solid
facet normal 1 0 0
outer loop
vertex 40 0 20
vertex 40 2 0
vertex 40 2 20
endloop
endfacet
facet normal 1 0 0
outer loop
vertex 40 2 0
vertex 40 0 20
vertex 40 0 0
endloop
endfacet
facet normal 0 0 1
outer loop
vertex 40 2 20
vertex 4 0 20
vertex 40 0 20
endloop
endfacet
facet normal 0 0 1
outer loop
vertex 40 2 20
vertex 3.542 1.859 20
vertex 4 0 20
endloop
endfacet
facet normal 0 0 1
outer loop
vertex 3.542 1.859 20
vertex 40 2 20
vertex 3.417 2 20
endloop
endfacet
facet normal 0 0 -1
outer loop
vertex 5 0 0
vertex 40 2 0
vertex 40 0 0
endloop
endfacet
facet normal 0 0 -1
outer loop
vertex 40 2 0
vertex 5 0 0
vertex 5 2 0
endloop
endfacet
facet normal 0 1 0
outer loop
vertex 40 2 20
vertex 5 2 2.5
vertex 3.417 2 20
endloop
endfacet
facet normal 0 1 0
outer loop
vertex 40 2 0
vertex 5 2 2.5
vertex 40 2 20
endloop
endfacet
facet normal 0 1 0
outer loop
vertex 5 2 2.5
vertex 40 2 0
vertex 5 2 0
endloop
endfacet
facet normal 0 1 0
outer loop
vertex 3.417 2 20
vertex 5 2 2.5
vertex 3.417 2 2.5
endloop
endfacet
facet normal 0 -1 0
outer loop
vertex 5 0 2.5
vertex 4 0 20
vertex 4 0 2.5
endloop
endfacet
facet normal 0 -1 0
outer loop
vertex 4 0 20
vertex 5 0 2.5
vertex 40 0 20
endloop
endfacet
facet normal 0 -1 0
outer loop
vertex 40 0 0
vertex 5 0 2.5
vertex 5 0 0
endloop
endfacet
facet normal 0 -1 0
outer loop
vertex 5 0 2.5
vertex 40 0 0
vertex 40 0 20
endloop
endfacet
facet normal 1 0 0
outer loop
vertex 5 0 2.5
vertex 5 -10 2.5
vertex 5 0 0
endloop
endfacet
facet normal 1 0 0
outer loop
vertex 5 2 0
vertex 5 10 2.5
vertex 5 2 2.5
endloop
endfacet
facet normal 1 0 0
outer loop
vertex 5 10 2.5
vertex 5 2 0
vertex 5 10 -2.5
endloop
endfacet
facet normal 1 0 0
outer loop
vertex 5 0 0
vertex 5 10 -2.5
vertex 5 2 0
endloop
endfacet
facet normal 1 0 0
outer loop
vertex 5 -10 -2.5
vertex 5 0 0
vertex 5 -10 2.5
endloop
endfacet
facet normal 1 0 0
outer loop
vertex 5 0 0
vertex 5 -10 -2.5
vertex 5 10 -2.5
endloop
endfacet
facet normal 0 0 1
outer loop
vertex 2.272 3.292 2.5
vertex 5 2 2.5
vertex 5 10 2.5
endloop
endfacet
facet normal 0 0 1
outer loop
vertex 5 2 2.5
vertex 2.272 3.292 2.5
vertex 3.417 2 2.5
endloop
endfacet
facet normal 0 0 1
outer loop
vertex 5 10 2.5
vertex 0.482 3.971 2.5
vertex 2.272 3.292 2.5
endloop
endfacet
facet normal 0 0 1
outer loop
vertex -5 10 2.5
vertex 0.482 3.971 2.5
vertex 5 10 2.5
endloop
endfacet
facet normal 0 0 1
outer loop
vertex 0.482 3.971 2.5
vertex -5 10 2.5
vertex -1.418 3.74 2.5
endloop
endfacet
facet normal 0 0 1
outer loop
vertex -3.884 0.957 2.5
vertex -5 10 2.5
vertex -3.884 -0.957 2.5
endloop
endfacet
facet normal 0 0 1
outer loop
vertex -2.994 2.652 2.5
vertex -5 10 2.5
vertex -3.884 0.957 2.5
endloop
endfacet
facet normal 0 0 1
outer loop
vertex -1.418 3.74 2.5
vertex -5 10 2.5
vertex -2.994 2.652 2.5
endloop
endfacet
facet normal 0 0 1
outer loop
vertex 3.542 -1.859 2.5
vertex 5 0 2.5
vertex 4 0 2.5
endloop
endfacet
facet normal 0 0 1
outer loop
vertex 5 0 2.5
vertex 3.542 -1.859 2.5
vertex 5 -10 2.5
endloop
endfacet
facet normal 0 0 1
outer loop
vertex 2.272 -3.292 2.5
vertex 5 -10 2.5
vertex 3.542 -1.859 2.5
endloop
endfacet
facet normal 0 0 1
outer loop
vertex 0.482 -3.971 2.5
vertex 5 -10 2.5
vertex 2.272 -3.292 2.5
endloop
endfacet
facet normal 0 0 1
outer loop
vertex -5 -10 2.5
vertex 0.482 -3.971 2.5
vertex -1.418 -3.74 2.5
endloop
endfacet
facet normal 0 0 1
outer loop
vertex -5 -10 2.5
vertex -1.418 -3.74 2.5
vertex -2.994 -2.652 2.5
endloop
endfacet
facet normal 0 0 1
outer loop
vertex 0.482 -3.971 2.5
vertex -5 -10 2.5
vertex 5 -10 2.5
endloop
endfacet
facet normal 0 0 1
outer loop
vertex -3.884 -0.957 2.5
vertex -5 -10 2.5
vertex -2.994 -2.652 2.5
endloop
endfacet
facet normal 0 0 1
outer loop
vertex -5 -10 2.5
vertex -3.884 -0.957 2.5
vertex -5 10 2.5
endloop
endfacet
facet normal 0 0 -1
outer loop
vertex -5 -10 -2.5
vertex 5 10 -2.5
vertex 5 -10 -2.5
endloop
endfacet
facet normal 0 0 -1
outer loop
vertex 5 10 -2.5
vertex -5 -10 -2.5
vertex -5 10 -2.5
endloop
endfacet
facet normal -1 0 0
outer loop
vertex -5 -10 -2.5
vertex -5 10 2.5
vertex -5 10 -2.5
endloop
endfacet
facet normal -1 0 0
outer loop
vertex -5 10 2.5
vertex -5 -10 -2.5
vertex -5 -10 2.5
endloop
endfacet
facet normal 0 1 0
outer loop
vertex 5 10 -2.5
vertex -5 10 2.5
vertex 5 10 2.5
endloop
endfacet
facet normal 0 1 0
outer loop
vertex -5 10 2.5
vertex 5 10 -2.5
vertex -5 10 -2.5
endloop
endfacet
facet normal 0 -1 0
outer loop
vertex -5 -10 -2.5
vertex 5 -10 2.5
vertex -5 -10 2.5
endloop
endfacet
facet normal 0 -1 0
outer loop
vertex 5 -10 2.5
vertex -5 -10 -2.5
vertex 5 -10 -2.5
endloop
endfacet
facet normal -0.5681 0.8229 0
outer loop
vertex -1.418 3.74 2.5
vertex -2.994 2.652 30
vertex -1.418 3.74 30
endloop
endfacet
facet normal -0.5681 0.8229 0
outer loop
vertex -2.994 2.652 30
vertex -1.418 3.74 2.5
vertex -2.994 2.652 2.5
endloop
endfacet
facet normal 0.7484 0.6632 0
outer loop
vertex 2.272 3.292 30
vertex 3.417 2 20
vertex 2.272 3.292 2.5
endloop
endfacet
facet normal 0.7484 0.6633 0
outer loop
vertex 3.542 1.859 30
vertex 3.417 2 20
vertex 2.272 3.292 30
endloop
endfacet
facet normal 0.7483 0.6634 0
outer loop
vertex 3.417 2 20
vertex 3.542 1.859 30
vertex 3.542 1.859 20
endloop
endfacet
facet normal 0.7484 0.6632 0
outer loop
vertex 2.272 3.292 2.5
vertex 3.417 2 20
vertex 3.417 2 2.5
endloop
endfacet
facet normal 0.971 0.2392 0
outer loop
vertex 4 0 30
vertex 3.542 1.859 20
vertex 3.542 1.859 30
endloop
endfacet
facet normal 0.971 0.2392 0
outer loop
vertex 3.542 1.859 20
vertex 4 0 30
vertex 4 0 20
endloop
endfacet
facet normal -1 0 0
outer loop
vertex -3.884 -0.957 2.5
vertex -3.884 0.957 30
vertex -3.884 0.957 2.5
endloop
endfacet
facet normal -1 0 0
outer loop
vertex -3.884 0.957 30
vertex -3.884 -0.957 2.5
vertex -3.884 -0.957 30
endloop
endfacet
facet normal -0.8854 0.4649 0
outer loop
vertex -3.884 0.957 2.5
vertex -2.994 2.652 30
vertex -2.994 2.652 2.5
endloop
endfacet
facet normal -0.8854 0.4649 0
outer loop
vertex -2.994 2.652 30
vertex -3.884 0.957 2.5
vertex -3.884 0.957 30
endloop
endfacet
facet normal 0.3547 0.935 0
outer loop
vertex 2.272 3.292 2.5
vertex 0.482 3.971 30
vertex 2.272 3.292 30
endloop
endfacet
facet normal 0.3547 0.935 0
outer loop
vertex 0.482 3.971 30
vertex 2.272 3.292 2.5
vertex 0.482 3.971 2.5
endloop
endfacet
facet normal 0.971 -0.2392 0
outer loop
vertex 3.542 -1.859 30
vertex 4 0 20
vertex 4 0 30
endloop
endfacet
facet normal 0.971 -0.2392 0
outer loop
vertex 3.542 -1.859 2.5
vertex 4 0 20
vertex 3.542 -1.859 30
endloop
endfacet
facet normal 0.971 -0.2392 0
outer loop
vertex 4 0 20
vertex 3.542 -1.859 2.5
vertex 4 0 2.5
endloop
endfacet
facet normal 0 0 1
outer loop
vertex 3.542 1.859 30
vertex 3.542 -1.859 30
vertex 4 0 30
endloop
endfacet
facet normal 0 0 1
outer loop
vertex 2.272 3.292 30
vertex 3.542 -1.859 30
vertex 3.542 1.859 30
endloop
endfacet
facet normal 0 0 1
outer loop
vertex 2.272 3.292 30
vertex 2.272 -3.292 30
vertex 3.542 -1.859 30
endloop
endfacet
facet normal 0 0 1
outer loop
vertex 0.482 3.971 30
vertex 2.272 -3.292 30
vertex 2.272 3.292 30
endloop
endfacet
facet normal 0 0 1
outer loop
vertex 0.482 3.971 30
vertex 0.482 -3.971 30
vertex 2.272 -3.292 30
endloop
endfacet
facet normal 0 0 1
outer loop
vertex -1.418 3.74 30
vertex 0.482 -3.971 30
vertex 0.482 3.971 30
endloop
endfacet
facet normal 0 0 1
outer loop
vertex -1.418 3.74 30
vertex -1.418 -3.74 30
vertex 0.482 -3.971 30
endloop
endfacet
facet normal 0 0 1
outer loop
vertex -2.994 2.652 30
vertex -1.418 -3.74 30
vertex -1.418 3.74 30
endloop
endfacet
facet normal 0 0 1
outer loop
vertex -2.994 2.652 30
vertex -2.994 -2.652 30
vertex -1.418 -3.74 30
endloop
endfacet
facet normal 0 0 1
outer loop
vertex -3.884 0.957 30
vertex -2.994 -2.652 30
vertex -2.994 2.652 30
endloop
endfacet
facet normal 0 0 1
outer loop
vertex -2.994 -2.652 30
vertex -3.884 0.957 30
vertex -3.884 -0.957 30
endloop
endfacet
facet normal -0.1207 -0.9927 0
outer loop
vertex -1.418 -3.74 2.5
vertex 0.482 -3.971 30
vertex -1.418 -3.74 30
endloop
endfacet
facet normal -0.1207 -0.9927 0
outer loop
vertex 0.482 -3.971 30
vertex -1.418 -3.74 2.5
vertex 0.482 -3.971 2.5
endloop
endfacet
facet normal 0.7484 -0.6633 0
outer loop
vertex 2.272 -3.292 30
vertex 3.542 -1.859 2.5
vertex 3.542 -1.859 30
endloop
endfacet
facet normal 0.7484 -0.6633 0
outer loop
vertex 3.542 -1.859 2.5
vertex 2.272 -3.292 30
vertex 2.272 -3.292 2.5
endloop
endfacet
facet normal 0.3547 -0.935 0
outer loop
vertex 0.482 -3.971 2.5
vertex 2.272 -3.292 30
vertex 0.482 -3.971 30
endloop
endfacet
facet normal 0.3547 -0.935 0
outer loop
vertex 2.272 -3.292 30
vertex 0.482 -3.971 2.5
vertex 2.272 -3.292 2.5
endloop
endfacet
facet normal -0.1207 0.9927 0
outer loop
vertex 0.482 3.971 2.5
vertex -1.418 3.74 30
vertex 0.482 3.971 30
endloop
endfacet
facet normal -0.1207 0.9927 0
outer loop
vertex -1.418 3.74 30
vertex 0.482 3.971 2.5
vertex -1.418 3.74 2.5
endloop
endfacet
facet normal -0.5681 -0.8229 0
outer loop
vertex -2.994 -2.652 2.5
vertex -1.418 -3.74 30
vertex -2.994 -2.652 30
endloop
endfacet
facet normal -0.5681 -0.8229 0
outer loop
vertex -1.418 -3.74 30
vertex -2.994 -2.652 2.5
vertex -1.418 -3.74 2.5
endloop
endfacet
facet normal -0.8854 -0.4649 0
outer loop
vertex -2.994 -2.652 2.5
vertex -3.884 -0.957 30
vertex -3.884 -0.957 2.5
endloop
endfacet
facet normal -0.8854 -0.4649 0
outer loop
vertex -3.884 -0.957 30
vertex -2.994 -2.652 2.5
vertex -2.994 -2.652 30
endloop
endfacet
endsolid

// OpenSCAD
module wall(width, height) cube([width, 2, height]);

wall(40, 20);
cube([10, 20, 5], true);
cylinder(30, r = 4);
